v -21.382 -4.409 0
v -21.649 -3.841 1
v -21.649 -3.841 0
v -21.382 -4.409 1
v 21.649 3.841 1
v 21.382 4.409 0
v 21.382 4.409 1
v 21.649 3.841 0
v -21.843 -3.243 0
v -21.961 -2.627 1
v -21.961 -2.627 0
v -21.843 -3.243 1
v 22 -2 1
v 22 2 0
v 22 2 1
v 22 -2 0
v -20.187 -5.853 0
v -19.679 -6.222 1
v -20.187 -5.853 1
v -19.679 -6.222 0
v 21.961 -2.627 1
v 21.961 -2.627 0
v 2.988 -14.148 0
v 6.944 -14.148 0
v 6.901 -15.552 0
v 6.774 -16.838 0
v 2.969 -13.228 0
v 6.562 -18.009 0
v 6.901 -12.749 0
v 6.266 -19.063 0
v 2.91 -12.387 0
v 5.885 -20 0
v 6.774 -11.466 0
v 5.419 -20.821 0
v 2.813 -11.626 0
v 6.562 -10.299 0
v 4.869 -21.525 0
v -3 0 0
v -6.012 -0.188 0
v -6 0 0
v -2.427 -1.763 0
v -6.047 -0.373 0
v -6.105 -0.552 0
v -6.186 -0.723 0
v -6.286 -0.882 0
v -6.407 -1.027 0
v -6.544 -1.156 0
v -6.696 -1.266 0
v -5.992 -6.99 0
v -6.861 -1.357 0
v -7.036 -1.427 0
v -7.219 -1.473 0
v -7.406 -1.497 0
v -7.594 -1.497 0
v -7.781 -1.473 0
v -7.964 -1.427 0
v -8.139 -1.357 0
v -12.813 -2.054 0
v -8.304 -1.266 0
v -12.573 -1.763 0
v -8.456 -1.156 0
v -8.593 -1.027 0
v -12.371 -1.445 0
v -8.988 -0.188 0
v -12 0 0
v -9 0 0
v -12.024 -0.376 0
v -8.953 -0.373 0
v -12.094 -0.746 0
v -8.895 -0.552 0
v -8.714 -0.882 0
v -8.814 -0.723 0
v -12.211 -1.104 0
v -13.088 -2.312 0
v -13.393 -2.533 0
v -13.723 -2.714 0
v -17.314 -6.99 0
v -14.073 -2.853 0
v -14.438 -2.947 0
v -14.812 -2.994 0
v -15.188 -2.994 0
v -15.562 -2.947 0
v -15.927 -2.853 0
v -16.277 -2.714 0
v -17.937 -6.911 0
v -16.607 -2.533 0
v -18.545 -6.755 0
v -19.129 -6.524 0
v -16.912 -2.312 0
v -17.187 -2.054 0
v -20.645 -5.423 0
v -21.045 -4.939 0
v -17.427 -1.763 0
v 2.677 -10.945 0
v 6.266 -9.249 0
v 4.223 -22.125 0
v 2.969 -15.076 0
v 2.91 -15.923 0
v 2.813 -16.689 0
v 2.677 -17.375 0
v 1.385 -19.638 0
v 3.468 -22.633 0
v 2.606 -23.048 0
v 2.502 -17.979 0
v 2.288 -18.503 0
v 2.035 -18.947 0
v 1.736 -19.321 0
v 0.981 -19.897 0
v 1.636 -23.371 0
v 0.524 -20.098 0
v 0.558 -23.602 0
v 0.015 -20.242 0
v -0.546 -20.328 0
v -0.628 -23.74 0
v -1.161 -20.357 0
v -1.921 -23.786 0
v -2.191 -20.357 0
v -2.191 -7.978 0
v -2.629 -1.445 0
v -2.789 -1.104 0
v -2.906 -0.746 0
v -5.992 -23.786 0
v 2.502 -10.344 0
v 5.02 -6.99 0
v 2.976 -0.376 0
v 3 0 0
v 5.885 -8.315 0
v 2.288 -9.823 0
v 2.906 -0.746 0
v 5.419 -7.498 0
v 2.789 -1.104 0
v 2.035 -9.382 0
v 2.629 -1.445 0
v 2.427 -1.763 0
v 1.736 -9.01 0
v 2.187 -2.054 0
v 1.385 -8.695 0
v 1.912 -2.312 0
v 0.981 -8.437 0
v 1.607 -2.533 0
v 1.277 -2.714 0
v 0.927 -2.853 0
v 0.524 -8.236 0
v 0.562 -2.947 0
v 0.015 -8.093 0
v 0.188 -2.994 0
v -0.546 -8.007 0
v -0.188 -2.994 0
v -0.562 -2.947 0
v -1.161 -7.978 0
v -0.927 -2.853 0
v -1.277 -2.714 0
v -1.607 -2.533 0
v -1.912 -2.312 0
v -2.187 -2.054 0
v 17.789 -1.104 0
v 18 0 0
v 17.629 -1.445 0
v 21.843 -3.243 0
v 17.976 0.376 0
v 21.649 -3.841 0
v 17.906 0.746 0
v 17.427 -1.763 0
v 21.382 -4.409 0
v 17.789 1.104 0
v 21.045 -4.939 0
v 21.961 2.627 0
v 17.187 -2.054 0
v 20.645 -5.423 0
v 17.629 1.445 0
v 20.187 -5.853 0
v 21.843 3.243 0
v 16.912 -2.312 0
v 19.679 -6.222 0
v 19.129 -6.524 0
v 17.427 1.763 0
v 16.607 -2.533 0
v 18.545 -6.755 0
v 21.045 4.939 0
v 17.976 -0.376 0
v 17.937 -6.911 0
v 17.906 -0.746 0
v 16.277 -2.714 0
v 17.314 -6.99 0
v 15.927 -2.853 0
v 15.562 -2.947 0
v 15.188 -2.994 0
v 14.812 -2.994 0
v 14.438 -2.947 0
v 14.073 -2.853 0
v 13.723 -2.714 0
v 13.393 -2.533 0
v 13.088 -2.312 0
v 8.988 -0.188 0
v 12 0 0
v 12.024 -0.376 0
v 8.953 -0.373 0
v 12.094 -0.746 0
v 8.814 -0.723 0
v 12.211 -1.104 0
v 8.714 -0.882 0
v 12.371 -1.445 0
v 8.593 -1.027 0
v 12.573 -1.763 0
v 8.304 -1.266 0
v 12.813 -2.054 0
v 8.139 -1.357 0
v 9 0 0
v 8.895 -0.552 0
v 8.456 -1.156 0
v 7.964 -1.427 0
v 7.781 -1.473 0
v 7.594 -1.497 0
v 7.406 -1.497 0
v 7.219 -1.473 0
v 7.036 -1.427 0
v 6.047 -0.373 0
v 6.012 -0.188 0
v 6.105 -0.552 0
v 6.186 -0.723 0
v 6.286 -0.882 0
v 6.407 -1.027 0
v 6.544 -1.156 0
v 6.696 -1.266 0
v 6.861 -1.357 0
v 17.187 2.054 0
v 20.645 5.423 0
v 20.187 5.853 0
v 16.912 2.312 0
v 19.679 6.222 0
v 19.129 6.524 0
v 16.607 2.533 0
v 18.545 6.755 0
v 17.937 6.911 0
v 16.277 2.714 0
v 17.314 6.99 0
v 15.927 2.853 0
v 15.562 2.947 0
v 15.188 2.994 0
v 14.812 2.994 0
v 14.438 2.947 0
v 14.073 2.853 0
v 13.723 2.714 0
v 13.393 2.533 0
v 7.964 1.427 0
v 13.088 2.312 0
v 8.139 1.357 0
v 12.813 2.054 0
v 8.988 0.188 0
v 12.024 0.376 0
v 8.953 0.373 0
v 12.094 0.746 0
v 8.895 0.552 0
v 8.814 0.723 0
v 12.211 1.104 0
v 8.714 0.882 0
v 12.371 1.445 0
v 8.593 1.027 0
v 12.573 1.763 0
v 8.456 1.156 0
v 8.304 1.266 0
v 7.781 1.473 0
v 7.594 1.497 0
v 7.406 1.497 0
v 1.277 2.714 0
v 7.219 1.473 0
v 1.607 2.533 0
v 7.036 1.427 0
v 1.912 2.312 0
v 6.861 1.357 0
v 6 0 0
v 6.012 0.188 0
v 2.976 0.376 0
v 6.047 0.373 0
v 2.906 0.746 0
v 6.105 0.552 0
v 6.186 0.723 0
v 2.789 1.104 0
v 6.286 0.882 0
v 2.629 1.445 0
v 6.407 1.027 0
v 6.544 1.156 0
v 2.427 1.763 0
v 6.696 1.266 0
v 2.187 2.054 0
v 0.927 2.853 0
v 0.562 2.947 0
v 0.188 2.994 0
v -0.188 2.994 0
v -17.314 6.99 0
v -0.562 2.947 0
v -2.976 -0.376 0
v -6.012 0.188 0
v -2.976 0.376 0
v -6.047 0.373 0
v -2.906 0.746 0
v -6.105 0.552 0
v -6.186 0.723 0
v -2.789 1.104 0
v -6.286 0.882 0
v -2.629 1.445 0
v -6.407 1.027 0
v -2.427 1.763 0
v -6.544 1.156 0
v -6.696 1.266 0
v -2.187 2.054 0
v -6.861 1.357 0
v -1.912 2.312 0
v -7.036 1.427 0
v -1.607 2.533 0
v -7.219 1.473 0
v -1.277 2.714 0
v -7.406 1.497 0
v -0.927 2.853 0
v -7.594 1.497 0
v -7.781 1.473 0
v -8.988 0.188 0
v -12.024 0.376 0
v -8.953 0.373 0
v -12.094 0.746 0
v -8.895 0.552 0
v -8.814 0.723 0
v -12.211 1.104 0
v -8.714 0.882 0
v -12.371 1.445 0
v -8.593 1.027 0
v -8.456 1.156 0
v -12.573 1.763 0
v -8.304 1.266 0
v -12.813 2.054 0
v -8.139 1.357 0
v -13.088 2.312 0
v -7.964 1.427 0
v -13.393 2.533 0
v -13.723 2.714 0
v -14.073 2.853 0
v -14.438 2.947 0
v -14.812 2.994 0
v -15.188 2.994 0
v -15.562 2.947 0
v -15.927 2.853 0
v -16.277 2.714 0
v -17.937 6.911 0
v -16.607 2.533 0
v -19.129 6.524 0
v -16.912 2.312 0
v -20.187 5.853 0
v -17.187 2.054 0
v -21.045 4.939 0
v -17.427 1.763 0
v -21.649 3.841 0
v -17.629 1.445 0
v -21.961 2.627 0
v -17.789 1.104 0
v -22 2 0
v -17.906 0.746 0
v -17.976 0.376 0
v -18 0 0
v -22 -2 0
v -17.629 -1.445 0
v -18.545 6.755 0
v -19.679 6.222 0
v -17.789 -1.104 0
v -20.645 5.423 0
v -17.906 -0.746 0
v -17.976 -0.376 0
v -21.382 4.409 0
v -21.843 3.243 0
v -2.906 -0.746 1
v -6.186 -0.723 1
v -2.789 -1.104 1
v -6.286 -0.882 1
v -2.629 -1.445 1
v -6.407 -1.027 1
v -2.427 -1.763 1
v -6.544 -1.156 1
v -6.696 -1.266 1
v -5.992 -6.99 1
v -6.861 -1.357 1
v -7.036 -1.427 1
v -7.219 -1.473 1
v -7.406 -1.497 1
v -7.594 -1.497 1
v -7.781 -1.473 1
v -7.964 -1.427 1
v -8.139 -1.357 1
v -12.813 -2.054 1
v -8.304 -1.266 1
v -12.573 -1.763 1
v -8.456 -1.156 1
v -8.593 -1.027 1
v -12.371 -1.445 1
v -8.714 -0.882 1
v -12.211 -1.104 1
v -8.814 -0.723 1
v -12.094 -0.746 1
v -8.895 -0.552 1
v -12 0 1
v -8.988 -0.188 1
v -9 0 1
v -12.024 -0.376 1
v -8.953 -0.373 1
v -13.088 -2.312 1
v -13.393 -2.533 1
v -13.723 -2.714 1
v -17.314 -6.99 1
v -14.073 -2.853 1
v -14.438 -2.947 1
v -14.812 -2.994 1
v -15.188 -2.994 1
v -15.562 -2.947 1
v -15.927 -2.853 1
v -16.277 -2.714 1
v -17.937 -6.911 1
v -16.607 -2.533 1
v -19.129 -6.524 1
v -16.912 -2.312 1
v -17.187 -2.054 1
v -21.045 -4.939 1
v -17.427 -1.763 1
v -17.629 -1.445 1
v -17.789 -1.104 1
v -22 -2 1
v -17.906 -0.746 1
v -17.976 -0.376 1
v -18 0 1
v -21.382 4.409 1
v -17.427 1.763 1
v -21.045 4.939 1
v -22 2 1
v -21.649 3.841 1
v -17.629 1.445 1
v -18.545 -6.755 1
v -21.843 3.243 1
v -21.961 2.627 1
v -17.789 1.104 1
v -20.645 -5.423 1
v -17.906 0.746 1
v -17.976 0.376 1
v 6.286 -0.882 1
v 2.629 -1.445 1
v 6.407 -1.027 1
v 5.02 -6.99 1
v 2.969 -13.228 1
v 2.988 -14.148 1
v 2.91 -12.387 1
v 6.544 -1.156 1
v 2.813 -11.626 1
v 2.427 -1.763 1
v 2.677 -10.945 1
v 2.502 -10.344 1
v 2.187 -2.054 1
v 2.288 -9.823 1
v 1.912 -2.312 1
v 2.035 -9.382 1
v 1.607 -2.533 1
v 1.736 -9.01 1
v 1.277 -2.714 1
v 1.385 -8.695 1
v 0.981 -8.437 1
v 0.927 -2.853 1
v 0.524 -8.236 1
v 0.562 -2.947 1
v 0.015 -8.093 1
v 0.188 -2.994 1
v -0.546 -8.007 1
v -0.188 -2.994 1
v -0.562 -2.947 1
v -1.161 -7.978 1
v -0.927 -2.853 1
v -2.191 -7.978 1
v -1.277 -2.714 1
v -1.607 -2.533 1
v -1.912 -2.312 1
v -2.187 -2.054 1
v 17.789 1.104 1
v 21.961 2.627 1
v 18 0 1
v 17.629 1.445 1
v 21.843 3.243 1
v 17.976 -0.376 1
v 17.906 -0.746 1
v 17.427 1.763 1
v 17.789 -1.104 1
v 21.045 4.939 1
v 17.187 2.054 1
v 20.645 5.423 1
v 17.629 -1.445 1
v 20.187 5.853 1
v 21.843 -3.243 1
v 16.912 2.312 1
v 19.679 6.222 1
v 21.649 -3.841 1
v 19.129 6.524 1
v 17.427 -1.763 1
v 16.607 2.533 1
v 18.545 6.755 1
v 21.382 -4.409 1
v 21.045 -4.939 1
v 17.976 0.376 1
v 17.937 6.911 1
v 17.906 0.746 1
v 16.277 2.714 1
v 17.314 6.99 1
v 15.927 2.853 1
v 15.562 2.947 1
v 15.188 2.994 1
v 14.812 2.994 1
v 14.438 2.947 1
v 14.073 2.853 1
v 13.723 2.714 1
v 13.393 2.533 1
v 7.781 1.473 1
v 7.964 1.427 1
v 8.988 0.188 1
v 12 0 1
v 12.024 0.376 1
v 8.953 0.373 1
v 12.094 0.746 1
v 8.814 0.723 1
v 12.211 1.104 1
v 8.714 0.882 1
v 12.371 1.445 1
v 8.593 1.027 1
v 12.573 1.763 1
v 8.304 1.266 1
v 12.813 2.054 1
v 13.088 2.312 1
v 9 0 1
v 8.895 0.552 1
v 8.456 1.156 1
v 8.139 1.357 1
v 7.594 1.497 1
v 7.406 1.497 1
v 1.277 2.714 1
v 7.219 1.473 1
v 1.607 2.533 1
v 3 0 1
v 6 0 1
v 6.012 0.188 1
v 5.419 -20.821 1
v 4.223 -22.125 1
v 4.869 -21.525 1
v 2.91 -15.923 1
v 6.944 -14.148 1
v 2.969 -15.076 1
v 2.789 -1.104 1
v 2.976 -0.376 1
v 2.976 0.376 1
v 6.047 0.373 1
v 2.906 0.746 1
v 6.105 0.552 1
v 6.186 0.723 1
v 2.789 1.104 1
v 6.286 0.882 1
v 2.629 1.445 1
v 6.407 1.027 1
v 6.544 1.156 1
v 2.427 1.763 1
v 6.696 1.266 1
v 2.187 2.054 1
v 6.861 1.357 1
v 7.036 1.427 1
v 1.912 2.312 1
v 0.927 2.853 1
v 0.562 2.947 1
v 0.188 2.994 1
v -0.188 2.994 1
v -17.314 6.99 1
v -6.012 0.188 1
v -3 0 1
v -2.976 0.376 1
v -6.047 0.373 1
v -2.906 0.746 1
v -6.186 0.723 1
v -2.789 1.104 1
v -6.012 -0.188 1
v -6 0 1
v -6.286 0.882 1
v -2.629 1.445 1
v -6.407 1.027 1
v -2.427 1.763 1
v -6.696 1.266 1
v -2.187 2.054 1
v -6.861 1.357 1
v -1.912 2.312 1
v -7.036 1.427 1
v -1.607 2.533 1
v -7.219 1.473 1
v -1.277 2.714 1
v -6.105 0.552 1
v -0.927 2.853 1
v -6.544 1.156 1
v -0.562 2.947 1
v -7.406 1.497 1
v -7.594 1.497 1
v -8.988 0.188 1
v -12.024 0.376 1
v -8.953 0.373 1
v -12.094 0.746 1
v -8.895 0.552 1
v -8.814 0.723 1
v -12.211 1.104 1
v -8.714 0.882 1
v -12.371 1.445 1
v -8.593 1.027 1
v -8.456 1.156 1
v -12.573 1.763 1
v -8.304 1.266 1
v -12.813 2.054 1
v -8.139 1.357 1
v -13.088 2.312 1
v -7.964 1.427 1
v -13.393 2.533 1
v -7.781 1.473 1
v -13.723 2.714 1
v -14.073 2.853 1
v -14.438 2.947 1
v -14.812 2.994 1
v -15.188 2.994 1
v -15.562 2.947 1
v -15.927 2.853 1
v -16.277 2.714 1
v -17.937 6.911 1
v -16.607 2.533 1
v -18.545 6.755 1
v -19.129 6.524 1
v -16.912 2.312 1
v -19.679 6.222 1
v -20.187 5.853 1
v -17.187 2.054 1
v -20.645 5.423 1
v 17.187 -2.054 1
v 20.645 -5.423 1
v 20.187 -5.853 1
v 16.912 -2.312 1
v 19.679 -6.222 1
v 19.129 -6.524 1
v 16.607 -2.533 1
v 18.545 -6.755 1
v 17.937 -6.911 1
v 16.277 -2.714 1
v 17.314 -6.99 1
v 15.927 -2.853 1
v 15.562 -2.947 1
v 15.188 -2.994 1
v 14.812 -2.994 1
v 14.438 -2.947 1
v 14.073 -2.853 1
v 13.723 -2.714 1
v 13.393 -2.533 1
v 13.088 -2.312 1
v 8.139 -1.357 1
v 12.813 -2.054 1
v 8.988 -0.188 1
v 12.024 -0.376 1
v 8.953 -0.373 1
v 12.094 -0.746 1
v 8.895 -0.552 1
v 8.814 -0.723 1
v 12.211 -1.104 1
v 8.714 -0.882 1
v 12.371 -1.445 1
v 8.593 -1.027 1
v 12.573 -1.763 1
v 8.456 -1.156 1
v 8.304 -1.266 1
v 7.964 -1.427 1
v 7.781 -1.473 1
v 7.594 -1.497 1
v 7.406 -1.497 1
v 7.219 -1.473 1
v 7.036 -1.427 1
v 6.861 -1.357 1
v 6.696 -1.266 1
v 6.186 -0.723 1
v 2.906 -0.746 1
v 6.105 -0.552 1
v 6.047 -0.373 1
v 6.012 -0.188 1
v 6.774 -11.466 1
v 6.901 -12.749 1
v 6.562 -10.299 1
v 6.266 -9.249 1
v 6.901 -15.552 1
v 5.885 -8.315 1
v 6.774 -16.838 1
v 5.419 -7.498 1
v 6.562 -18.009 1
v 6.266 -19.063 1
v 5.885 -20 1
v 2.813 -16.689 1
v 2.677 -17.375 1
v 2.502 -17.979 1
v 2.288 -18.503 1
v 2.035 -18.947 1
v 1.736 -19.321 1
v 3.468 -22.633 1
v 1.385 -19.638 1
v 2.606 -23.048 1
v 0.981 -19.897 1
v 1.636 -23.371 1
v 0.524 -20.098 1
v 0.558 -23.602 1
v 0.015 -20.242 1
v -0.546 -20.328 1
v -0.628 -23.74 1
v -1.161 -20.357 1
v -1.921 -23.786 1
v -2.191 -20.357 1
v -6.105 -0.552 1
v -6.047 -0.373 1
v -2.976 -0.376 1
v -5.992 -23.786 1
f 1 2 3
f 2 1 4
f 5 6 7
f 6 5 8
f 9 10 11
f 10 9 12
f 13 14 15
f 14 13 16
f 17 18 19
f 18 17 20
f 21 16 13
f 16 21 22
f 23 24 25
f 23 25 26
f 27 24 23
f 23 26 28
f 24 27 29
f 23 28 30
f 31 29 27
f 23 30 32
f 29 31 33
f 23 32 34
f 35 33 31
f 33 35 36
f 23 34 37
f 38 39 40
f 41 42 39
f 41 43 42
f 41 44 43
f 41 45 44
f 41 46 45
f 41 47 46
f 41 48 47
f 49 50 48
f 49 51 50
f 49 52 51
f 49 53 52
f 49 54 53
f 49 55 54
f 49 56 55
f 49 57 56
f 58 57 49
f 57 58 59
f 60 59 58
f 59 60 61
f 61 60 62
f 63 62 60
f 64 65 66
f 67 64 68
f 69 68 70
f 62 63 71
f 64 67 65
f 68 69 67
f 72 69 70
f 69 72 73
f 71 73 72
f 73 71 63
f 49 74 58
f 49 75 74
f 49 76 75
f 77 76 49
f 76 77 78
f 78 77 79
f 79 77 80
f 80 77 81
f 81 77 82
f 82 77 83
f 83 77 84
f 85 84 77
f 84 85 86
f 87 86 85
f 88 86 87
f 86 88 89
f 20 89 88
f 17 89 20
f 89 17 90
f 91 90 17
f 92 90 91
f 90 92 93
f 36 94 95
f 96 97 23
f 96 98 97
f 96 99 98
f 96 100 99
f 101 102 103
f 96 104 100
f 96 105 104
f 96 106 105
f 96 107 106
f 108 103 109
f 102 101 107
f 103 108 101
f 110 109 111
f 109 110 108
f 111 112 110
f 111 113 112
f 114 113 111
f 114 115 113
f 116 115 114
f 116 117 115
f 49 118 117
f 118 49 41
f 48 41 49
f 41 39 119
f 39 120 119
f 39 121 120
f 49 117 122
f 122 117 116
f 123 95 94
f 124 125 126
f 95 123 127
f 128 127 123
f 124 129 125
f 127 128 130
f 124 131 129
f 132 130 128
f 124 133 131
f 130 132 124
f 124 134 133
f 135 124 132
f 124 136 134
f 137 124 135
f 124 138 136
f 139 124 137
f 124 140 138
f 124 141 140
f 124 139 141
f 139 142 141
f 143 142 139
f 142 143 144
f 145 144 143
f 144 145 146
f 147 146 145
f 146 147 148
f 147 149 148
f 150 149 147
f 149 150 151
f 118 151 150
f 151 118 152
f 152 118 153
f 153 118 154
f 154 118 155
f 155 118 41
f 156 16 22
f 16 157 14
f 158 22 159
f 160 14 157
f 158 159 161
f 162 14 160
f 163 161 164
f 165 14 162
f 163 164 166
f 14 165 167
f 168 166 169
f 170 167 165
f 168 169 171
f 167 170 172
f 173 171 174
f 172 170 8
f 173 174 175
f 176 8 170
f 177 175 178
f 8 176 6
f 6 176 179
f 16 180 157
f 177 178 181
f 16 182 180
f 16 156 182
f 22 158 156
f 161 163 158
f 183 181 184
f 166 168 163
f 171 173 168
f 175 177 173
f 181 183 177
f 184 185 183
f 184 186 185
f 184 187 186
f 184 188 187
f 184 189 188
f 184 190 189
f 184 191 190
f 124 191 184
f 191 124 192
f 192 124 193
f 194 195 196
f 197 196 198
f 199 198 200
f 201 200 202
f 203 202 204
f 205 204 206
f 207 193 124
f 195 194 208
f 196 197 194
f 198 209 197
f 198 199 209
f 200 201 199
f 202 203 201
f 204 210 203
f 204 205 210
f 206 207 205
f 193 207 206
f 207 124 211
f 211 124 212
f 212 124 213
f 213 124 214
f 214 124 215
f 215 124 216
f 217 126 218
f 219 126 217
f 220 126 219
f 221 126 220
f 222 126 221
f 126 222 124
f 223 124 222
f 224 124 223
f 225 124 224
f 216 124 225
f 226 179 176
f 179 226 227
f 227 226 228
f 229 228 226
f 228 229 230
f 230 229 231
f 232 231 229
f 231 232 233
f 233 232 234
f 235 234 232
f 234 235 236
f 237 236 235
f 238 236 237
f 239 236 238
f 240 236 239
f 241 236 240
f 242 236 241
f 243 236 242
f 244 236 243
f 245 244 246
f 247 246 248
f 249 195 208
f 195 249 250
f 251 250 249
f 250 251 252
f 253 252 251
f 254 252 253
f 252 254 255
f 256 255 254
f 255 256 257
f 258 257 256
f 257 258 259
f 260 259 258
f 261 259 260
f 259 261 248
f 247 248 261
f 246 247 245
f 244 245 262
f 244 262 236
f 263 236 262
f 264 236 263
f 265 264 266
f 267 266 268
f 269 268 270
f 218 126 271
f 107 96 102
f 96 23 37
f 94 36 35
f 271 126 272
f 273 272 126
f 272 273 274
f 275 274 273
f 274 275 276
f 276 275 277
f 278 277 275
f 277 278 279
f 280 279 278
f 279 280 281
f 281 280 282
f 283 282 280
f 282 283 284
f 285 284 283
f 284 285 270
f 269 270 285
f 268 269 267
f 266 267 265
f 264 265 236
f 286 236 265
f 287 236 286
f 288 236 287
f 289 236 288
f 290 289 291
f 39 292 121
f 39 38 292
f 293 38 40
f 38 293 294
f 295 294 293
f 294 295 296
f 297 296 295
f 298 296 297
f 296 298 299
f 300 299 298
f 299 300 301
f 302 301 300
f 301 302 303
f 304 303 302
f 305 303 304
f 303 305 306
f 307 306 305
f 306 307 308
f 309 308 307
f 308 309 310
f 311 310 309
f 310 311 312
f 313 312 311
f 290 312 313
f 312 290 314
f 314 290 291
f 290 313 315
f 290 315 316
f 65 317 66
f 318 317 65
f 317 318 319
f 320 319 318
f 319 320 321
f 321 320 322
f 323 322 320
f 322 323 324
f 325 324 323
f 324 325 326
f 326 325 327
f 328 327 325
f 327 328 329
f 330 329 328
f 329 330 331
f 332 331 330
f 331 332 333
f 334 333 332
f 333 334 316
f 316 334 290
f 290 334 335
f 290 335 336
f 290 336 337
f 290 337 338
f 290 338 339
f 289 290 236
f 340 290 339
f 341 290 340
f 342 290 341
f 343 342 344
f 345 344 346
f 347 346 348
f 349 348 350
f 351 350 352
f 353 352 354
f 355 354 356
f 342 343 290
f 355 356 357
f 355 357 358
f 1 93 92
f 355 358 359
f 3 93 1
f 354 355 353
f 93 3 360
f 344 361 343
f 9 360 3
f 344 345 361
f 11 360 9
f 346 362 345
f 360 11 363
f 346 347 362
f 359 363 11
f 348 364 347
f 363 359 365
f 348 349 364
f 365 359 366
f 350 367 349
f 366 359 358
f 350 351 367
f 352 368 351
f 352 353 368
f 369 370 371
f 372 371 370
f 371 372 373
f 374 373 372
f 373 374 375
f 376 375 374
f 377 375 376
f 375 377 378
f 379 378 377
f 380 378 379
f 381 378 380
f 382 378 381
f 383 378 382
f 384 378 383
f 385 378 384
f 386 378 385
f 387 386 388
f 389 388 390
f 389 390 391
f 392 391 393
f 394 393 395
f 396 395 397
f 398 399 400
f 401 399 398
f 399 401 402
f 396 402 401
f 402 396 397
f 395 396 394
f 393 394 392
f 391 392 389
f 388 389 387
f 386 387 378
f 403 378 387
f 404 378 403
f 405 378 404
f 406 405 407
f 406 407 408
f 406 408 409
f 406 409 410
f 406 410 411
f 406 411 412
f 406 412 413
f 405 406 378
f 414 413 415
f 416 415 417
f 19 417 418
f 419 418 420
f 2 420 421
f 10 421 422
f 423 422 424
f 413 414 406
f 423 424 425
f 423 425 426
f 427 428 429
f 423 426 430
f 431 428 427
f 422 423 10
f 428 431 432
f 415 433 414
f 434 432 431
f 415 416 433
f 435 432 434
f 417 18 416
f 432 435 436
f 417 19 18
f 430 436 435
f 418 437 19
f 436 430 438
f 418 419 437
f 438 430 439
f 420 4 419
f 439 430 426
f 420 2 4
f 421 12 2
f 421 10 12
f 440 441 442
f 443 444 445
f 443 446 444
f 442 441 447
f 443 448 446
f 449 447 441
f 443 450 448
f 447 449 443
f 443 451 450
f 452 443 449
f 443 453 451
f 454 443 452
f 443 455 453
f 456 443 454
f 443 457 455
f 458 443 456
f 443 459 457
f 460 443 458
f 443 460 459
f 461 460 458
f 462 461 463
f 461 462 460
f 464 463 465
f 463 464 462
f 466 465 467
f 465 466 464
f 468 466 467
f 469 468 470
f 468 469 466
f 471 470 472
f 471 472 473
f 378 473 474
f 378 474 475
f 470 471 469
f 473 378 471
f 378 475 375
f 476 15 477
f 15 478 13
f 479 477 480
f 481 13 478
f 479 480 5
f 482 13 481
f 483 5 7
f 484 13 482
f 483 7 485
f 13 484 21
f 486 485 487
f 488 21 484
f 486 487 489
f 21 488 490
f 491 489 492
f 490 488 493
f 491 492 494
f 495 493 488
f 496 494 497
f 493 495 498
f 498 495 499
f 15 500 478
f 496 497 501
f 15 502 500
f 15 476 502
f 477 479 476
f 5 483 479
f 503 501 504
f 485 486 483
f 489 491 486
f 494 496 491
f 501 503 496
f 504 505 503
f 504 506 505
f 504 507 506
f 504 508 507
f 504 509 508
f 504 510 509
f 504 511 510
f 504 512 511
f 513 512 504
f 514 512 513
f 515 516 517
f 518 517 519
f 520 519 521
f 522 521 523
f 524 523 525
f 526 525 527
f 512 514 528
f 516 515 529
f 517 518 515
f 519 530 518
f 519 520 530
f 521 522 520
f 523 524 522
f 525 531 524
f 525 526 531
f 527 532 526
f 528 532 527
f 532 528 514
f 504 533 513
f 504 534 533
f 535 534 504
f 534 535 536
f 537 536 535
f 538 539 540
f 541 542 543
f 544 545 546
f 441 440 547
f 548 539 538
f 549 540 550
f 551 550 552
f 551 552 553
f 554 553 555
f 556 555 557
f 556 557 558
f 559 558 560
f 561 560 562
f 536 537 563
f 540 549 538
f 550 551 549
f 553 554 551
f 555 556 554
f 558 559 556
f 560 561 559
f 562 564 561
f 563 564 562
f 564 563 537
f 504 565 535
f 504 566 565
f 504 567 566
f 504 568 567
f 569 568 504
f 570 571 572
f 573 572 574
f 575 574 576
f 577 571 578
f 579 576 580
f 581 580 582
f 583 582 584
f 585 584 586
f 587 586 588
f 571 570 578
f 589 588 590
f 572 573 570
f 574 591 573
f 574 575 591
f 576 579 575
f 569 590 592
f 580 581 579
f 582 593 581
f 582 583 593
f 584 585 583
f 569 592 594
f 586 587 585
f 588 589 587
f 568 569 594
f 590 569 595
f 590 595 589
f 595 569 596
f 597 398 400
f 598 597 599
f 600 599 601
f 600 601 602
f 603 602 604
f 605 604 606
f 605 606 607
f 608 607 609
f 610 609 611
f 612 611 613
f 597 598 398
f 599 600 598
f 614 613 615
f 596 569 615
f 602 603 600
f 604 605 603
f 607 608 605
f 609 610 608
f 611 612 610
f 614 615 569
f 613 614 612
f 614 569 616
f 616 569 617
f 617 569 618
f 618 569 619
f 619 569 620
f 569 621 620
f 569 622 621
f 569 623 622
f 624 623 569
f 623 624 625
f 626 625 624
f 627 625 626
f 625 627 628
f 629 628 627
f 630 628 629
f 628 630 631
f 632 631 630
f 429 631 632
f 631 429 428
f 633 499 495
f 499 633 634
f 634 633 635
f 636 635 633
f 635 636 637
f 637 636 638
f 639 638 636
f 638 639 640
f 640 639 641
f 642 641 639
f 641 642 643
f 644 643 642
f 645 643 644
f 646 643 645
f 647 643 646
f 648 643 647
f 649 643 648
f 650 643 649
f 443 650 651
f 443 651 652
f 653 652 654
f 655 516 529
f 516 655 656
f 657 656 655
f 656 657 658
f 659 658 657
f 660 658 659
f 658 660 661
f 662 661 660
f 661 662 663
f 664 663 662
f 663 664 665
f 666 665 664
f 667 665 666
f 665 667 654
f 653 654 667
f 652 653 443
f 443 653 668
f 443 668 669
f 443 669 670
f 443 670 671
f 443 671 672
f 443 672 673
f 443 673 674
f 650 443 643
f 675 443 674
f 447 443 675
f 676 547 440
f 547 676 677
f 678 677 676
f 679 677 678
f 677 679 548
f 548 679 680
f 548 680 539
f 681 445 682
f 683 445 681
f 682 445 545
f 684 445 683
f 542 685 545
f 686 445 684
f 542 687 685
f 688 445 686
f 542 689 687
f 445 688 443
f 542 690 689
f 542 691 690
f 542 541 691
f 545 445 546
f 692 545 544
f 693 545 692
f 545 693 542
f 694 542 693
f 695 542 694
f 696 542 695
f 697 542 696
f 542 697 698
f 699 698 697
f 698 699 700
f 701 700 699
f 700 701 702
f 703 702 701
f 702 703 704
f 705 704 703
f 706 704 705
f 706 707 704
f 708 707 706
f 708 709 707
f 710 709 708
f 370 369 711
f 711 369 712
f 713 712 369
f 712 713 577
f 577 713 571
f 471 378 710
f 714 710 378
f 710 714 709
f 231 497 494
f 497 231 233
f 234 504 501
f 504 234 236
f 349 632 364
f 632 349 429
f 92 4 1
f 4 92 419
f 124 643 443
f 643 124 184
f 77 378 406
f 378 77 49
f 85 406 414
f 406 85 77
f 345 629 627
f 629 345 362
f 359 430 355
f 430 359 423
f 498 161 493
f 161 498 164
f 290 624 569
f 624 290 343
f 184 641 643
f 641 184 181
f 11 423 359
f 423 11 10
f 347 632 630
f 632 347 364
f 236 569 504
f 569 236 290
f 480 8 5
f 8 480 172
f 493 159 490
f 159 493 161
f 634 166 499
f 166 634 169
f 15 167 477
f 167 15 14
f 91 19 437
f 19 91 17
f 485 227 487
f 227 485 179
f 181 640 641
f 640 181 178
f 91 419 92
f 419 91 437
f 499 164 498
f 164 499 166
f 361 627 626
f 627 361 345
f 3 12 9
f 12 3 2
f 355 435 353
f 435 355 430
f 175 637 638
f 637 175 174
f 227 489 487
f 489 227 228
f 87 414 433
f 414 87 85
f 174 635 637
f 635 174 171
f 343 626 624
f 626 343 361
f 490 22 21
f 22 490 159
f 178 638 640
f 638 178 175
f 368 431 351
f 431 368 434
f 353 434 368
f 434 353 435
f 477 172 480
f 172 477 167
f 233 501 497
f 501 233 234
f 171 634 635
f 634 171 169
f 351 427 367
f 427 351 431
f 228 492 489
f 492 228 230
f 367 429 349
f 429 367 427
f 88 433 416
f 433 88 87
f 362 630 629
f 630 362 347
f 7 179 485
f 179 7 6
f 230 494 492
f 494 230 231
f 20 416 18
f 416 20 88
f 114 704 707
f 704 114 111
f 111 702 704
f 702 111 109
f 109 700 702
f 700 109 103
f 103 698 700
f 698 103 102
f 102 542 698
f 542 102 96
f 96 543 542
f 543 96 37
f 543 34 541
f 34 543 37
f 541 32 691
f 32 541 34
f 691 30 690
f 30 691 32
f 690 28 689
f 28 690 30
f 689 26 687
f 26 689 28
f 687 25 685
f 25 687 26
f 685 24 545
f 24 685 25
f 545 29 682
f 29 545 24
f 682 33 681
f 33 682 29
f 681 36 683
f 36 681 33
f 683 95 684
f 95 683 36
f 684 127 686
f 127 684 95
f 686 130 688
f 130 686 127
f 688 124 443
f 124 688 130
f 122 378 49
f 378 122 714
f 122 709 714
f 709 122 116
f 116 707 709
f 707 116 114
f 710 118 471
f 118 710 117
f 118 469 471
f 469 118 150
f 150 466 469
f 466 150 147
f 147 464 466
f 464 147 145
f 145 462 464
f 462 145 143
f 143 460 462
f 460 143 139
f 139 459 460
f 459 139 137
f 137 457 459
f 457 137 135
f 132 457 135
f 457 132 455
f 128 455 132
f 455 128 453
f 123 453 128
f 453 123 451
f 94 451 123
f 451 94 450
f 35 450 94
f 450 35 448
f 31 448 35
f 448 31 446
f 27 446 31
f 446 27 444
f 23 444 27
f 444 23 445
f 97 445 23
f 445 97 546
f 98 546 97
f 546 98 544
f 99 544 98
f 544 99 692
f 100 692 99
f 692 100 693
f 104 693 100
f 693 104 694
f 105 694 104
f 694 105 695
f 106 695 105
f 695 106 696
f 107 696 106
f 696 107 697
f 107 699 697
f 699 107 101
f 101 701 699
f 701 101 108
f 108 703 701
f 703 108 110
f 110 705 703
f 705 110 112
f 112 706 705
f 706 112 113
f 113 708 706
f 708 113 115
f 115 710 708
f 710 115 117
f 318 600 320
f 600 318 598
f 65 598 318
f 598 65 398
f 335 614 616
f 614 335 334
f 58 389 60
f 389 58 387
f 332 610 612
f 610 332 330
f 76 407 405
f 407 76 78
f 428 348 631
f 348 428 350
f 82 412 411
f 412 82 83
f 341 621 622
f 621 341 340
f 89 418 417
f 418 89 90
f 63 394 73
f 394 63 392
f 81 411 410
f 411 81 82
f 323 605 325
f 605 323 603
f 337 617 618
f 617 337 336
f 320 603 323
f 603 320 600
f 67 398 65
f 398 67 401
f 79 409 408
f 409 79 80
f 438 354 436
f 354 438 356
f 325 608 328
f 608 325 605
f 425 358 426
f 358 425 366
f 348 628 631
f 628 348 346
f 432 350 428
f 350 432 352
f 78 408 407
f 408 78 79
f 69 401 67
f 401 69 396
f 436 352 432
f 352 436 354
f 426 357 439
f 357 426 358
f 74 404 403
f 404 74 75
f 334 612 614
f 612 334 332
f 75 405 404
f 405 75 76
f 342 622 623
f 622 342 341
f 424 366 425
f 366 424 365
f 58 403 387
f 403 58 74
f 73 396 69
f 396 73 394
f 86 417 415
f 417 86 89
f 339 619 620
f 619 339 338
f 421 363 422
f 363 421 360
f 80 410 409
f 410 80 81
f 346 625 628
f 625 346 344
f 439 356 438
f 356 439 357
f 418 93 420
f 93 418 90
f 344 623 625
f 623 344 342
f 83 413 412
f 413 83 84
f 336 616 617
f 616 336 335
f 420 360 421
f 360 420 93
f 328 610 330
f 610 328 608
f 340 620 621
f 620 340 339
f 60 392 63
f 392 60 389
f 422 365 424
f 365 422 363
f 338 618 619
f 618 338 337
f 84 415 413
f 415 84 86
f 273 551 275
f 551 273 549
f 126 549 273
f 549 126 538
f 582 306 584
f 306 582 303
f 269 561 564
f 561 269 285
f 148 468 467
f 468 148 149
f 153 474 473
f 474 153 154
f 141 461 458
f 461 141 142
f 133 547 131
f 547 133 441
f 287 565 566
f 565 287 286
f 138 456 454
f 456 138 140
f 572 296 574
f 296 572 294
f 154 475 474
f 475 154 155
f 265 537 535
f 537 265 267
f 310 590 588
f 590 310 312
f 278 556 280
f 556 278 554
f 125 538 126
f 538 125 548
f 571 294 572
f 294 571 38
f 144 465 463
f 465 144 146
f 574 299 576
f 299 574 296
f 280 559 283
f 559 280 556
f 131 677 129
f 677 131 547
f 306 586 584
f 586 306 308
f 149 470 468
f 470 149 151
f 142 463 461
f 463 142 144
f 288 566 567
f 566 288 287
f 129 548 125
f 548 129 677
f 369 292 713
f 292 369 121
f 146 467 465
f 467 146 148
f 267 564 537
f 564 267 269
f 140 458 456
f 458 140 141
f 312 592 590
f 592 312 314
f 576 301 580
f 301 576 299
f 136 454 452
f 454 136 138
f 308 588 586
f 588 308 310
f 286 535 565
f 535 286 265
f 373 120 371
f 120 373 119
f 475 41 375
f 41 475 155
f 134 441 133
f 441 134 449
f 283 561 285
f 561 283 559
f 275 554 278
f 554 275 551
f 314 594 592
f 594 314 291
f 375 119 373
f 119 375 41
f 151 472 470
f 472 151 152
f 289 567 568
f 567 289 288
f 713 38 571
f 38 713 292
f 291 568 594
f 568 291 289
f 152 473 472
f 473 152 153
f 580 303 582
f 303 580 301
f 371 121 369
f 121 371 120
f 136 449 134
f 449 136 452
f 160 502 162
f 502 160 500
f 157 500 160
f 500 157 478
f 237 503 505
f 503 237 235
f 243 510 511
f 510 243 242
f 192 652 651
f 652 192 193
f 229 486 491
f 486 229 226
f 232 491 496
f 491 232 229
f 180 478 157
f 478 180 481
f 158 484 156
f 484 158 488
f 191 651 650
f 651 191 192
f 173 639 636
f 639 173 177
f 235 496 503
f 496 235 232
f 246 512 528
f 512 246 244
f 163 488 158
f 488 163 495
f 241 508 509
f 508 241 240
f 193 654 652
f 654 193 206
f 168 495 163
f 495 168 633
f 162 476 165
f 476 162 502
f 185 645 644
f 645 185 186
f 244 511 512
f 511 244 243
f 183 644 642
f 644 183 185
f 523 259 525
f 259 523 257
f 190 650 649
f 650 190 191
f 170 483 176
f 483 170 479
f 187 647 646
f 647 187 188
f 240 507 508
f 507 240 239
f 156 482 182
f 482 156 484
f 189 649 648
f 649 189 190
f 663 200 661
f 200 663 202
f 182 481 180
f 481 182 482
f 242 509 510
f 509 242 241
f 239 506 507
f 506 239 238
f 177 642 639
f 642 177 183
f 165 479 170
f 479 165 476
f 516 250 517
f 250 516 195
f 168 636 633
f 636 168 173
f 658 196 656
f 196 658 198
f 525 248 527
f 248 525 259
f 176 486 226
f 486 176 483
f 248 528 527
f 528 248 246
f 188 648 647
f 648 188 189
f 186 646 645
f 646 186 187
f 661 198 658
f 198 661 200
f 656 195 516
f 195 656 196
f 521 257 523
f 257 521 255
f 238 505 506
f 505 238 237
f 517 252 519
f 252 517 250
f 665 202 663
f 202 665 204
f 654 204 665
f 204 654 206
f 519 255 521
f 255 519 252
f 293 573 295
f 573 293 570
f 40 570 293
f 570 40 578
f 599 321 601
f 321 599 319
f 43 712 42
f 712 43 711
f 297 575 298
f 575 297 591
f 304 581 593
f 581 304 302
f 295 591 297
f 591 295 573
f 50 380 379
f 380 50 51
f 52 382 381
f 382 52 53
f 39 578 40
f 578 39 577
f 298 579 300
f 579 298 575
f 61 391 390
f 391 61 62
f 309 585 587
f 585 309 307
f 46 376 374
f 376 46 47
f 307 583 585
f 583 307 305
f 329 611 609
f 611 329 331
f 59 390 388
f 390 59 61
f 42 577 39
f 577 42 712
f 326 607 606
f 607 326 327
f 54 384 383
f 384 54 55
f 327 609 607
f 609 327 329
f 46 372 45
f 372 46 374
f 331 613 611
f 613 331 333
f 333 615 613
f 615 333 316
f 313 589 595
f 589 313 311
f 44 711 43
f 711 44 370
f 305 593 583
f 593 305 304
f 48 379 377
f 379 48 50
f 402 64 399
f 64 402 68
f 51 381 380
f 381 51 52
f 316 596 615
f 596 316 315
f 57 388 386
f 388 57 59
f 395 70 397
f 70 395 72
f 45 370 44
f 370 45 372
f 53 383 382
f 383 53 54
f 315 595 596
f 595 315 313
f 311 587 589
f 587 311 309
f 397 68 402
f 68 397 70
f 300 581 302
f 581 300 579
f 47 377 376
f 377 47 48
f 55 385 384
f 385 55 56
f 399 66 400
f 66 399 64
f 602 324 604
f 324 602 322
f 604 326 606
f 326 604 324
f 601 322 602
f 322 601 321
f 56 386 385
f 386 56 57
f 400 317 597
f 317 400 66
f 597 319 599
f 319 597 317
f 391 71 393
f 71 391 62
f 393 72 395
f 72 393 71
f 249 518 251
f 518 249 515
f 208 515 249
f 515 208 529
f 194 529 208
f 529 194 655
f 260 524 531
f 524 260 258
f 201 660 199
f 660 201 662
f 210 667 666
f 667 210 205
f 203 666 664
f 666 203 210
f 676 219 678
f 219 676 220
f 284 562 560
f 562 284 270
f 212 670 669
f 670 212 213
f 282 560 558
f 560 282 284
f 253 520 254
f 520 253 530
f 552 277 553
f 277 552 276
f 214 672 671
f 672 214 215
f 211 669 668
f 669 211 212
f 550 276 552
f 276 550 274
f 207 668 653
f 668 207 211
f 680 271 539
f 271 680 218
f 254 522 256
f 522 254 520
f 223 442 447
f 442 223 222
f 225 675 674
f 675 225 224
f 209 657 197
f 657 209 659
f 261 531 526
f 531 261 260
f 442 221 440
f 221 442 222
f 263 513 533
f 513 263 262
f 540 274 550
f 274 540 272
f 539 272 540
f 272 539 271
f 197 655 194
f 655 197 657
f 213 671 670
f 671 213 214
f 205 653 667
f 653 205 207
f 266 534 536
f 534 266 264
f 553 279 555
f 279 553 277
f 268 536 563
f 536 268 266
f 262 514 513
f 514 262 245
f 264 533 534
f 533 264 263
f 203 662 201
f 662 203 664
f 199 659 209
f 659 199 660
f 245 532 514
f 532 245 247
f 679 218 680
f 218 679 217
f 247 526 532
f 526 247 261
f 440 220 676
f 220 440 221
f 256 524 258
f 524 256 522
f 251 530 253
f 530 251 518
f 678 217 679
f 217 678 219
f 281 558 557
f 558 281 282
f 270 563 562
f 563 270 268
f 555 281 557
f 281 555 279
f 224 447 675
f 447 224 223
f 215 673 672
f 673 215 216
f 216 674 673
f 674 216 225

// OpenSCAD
$fn = 50;


difference() {
	union() {
		hull() {
			translate(v = [-17.0000000000, 2.0000000000, 0]) {
				cylinder(h = 1, r = 5);
			}
			translate(v = [17.0000000000, 2.0000000000, 0]) {
				cylinder(h = 1, r = 5);
			}
			translate(v = [-17.0000000000, -2.0000000000, 0]) {
				cylinder(h = 1, r = 5);
			}
			translate(v = [17.0000000000, -2.0000000000, 0]) {
				cylinder(h = 1, r = 5);
			}
		}
		translate(v = [0, -5, 0]) {
			linear_extrude(height = 1) {
				text(font = "DejaVu Sans Mono:style=Bold", halign = "center", size = 19.0000000000, text = "D", valign = "top");
			}
		}
	}
	union() {
		translate(v = [-15.0000000000, 0.0000000000, 0]) {
			translate(v = [0, 0, -100]) {
				cylinder(h = 200, r = 3.0000000000);
			}
		}
		translate(v = [0, 0, -100]) {
			cylinder(h = 200, r = 3.0000000000);
		}
		translate(v = [15.0000000000, 0.0000000000, 0]) {
			translate(v = [0, 0, -100]) {
				cylinder(h = 200, r = 3.0000000000);
			}
		}
		translate(v = [-15.0000000000, 0.0000000000, 0]) {
			translate(v = [0, 0, -100]) {
				cylinder(h = 200, r = 1.5000000000);
			}
		}
		translate(v = [-7.5000000000, 0.0000000000, 0]) {
			translate(v = [0, 0, -100]) {
				cylinder(h = 200, r = 1.5000000000);
			}
		}
		translate(v = [0, 0, -100]) {
			cylinder(h = 200, r = 1.5000000000);
		}
		translate(v = [7.5000000000, 0.0000000000, 0]) {
			translate(v = [0, 0, -100]) {
				cylinder(h = 200, r = 1.5000000000);
			}
		}
		translate(v = [15.0000000000, 0.0000000000, 0]) {
			translate(v = [0, 0, -100]) {
				cylinder(h = 200, r = 1.5000000000);
			}
		}
	}
}
